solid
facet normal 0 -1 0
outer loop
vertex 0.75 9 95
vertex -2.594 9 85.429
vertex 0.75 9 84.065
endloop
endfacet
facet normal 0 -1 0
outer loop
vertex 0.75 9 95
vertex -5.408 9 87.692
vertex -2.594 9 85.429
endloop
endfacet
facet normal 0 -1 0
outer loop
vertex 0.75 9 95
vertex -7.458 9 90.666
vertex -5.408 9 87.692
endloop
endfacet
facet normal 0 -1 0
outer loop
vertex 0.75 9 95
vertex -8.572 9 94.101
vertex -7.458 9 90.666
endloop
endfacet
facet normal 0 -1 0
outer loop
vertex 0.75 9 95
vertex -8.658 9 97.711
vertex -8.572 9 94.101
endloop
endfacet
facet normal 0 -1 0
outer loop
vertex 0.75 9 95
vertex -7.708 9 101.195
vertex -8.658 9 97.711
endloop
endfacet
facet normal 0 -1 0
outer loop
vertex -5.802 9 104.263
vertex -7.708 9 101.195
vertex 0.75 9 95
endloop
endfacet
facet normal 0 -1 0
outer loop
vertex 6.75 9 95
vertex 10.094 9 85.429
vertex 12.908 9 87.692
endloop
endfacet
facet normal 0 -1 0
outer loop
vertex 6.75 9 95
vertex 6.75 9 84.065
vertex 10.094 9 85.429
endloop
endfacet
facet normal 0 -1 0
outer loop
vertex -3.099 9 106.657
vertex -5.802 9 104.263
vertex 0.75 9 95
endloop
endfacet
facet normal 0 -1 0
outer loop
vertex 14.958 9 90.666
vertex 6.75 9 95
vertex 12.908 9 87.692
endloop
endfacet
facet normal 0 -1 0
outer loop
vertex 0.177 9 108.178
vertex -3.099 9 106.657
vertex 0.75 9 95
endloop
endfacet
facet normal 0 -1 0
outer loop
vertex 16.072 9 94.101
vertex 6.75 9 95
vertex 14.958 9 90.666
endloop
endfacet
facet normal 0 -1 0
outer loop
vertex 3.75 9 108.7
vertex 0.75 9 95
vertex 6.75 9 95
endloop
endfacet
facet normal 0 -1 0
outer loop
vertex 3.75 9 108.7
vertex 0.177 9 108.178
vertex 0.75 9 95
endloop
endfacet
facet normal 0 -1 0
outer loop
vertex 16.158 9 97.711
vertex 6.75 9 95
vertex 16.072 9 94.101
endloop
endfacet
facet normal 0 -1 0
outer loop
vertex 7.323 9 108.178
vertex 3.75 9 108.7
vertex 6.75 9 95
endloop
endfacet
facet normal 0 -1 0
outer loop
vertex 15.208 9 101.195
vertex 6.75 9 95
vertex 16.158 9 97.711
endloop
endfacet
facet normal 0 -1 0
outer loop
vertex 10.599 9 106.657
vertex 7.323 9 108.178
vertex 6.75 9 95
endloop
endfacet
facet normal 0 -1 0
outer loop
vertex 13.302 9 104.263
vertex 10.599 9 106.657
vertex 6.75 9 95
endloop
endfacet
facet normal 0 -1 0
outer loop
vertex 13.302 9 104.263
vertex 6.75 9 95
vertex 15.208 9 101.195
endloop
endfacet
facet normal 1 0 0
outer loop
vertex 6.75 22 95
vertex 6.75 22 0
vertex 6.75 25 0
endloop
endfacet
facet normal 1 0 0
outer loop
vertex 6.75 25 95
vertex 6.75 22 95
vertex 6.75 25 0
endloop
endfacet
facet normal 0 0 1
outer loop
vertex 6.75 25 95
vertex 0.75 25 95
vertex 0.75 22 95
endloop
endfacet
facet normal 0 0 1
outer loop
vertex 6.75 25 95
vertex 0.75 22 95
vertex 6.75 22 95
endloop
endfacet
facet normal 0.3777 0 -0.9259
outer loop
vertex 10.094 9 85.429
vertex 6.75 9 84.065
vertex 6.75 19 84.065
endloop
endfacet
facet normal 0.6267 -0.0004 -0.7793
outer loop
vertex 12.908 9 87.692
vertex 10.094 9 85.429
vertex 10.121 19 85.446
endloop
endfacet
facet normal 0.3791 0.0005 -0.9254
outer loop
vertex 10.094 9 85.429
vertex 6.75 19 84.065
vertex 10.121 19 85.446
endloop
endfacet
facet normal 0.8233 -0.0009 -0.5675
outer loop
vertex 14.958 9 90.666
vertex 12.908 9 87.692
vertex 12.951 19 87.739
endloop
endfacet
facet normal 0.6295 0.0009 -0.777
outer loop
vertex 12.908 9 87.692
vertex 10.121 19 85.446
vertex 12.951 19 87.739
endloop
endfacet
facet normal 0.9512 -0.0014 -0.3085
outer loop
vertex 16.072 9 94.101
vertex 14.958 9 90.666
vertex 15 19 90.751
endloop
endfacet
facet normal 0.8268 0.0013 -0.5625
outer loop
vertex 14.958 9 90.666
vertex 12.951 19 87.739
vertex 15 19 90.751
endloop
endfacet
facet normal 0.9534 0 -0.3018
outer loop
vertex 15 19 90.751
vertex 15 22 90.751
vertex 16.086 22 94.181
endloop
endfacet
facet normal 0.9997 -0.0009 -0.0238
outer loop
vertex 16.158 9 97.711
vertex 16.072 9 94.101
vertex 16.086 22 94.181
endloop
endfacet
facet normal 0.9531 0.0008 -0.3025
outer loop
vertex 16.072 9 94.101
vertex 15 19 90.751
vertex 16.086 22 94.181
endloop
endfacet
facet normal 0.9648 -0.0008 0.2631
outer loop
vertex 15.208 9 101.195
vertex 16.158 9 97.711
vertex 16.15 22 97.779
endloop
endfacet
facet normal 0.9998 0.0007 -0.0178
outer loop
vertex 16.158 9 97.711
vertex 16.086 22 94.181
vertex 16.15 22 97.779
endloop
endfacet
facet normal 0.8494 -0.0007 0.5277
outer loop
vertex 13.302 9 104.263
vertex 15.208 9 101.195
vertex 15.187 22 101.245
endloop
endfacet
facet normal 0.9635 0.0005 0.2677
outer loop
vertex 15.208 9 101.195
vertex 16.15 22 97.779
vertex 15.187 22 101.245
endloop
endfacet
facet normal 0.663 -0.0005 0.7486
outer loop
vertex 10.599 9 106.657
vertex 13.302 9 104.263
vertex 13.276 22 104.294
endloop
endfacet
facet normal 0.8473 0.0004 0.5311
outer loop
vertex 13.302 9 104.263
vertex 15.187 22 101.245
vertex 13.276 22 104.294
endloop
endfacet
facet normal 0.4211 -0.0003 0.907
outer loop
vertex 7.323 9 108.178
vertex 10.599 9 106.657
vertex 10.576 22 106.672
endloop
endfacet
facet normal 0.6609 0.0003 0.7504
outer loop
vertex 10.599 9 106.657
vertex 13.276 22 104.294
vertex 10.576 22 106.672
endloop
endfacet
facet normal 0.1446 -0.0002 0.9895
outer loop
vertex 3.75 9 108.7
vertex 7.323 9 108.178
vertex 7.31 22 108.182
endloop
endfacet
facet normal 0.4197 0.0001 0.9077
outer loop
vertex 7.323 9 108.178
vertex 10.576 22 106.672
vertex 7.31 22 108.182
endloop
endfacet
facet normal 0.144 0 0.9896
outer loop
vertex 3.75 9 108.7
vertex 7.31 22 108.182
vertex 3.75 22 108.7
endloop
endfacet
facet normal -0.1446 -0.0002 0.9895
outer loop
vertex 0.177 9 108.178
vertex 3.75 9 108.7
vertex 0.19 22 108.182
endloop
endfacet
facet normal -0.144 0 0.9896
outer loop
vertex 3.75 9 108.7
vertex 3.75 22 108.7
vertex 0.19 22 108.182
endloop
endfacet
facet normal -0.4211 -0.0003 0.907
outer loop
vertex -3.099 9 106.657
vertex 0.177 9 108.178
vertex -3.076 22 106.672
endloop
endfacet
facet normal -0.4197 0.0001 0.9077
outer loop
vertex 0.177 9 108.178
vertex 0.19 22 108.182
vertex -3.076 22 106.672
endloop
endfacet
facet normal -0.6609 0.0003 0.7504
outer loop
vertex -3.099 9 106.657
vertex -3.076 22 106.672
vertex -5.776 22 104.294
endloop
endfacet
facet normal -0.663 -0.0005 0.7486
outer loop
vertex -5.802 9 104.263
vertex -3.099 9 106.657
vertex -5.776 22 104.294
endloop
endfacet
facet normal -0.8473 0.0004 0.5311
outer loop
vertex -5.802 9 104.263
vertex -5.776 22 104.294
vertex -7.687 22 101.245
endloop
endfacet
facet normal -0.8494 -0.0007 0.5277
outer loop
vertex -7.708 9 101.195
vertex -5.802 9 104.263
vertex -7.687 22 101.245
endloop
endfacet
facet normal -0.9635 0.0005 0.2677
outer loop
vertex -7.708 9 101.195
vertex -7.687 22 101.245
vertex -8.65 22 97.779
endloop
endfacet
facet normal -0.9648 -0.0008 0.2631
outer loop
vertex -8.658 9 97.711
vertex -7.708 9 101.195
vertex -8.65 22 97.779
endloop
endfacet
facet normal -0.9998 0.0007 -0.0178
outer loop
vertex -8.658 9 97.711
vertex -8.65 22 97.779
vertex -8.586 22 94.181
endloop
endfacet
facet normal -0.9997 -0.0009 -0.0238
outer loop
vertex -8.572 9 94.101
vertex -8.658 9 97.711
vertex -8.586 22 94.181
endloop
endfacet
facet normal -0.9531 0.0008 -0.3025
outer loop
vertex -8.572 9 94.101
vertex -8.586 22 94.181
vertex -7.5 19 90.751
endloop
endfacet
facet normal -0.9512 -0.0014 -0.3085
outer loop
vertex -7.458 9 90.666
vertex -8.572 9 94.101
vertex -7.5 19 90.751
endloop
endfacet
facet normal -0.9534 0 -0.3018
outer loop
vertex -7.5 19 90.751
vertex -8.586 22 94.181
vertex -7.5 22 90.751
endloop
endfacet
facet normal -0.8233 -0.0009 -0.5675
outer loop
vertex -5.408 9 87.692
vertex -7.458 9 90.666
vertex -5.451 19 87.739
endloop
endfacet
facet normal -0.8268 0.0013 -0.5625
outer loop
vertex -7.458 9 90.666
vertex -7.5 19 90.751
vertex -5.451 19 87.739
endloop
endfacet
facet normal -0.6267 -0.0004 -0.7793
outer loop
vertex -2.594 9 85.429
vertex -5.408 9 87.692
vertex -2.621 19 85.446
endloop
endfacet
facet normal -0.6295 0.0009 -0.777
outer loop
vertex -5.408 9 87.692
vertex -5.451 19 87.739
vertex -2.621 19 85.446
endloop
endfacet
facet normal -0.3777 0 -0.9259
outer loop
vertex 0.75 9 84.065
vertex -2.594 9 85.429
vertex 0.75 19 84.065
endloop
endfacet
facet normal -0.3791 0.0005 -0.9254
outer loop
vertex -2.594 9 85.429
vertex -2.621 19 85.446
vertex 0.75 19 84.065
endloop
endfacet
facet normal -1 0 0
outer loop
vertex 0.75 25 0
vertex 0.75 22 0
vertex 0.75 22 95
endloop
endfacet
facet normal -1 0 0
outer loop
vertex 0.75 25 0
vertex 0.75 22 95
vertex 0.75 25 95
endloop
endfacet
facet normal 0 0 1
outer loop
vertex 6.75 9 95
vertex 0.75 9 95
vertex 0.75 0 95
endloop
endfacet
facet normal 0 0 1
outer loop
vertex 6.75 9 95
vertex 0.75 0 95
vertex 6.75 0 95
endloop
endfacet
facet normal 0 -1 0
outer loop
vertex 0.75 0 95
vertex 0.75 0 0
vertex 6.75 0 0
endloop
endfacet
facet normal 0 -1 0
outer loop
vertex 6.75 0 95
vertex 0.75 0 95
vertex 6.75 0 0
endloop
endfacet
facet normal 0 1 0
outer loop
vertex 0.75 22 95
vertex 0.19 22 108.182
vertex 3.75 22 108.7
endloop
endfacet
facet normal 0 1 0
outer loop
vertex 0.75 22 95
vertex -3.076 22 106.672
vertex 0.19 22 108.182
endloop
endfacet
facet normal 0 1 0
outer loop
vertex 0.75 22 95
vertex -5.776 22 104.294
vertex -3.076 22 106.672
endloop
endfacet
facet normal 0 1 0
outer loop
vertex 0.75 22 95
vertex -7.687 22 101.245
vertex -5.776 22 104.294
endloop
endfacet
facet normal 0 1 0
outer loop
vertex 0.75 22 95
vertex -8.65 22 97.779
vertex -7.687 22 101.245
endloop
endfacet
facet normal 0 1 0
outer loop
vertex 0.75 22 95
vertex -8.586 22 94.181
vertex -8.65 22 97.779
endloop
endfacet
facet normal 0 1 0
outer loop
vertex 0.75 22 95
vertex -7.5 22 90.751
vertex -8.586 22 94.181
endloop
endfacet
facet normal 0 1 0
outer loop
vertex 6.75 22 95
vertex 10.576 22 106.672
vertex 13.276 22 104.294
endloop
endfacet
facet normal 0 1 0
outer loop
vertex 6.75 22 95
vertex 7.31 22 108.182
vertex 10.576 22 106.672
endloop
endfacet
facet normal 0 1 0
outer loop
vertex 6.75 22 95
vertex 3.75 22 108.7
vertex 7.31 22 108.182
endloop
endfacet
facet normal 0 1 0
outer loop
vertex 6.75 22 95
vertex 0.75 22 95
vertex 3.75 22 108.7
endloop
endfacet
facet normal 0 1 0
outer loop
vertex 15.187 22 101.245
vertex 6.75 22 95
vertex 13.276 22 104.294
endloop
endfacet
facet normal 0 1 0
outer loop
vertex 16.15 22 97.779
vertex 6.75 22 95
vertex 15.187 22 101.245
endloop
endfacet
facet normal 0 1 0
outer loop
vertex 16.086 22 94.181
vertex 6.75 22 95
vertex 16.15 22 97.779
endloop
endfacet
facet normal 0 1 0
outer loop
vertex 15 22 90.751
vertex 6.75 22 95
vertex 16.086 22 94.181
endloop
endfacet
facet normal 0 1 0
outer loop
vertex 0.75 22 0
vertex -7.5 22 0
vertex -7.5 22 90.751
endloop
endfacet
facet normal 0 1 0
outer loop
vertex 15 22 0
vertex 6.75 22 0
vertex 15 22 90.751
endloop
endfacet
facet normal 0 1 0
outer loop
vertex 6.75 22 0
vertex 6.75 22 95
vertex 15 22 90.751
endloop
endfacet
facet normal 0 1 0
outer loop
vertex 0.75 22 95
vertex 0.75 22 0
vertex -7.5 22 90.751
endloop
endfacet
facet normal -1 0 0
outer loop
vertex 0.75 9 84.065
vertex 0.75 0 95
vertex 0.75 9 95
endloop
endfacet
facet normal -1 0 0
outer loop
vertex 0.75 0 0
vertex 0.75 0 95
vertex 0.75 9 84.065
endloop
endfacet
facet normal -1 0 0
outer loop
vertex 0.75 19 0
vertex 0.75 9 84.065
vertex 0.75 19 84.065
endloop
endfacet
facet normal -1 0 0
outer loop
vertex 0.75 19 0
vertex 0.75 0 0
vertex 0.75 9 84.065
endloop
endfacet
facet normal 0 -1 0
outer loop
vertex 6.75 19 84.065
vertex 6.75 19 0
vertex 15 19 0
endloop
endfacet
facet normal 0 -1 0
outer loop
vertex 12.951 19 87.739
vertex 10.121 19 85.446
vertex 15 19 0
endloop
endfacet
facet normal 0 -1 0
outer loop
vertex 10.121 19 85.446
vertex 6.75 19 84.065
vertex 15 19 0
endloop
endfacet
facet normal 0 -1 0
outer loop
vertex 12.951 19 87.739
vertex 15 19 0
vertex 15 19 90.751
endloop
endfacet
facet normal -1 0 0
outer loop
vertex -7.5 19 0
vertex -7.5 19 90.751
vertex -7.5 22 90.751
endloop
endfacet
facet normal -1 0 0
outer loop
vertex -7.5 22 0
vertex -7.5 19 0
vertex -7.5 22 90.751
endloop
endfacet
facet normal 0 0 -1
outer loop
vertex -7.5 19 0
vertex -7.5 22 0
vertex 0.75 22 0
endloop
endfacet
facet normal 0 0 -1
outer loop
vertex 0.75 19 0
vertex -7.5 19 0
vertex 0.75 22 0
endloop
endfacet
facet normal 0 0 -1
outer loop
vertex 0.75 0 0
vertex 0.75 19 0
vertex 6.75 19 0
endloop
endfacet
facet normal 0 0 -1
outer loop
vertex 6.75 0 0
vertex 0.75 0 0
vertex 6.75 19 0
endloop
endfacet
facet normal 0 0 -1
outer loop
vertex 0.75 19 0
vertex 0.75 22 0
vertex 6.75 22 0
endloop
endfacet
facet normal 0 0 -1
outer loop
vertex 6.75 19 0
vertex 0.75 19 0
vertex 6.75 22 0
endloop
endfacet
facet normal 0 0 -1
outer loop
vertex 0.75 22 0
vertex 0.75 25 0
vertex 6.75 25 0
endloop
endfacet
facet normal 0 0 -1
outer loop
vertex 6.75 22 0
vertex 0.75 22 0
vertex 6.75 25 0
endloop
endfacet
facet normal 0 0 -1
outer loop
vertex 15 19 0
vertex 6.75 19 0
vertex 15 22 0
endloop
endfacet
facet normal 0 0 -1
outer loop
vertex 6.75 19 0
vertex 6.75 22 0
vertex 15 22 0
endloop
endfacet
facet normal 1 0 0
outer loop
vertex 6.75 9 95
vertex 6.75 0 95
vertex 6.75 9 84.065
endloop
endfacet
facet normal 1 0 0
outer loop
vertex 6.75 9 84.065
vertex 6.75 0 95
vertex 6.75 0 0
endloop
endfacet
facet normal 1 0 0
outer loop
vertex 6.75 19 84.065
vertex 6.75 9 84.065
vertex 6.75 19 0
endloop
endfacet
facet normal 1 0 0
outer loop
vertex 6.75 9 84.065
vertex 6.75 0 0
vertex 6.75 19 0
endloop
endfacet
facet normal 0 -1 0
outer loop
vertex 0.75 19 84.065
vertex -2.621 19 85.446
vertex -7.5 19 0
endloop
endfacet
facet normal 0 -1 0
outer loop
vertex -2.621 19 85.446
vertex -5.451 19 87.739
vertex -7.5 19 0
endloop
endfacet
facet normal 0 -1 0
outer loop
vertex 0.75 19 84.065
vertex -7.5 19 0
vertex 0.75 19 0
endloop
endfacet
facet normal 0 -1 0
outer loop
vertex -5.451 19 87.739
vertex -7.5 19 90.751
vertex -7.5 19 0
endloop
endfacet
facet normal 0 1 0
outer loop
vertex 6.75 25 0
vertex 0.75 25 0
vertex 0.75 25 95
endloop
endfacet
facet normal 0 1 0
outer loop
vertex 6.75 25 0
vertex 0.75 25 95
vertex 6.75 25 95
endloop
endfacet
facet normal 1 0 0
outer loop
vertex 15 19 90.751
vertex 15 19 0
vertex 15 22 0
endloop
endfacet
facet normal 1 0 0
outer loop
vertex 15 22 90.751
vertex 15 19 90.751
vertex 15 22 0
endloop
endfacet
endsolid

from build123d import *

# Parameters (mm, degrees)
BOX008_W               = 22.5
BOX008_H               = 3
BOX008_DEPTH           = 95
BOX009_W               = 6
BOX009_H               = 25
BOX009_DEPTH           = 95
CYLINDER012_R          = 12.5
CYLINDER012_DEPTH      = 13
CYLINDER012_ROLL_ANGLE = 90


with BuildPart() as cube008:
    # Box008 → Box008 (new body)
    with BuildSketch(Plane(origin=(-7.5, 19, 0), x_dir=(1, 0, 0), z_dir=(0, 0, 1))):
        with Locations((11.25, 1.5)):
            Rectangle(BOX008_W, BOX008_H)
    extrude(amount=BOX008_DEPTH)


with BuildPart() as cube009:
    # Box009 → Box009 (new body)
    with BuildSketch(Plane(origin=(0.75, 0, 0), x_dir=(1, 0, 0), z_dir=(0, 0, 1))):
        with Locations((3, 12.5)):
            Rectangle(BOX009_W, BOX009_H)
    extrude(amount=BOX009_DEPTH)


with BuildPart() as art1motorholemaster:
    # Cylinder012 → Cylinder012 (new body)
    with BuildSketch(Plane.XY):
        Circle(CYLINDER012_R)
    extrude(amount=CYLINDER012_DEPTH)


with BuildPart() as art1motorholemaster_1:
    # Cylinder012 roll: moved
    add(art1motorholemaster.part.rotate(Axis((0, 0, 0), (1, 0, 0)), CYLINDER012_ROLL_ANGLE))


with BuildPart() as art1motorholemaster_2:
    # Cylinder012 placement: moved
    add(art1motorholemaster_1.part.moved(Location((3.75, 22, 96.2))))

    # Fusion017: union Cube008, Cube009
    add(cube008.part)
    add(cube009.part)


solid = art1motorholemaster_2.part
